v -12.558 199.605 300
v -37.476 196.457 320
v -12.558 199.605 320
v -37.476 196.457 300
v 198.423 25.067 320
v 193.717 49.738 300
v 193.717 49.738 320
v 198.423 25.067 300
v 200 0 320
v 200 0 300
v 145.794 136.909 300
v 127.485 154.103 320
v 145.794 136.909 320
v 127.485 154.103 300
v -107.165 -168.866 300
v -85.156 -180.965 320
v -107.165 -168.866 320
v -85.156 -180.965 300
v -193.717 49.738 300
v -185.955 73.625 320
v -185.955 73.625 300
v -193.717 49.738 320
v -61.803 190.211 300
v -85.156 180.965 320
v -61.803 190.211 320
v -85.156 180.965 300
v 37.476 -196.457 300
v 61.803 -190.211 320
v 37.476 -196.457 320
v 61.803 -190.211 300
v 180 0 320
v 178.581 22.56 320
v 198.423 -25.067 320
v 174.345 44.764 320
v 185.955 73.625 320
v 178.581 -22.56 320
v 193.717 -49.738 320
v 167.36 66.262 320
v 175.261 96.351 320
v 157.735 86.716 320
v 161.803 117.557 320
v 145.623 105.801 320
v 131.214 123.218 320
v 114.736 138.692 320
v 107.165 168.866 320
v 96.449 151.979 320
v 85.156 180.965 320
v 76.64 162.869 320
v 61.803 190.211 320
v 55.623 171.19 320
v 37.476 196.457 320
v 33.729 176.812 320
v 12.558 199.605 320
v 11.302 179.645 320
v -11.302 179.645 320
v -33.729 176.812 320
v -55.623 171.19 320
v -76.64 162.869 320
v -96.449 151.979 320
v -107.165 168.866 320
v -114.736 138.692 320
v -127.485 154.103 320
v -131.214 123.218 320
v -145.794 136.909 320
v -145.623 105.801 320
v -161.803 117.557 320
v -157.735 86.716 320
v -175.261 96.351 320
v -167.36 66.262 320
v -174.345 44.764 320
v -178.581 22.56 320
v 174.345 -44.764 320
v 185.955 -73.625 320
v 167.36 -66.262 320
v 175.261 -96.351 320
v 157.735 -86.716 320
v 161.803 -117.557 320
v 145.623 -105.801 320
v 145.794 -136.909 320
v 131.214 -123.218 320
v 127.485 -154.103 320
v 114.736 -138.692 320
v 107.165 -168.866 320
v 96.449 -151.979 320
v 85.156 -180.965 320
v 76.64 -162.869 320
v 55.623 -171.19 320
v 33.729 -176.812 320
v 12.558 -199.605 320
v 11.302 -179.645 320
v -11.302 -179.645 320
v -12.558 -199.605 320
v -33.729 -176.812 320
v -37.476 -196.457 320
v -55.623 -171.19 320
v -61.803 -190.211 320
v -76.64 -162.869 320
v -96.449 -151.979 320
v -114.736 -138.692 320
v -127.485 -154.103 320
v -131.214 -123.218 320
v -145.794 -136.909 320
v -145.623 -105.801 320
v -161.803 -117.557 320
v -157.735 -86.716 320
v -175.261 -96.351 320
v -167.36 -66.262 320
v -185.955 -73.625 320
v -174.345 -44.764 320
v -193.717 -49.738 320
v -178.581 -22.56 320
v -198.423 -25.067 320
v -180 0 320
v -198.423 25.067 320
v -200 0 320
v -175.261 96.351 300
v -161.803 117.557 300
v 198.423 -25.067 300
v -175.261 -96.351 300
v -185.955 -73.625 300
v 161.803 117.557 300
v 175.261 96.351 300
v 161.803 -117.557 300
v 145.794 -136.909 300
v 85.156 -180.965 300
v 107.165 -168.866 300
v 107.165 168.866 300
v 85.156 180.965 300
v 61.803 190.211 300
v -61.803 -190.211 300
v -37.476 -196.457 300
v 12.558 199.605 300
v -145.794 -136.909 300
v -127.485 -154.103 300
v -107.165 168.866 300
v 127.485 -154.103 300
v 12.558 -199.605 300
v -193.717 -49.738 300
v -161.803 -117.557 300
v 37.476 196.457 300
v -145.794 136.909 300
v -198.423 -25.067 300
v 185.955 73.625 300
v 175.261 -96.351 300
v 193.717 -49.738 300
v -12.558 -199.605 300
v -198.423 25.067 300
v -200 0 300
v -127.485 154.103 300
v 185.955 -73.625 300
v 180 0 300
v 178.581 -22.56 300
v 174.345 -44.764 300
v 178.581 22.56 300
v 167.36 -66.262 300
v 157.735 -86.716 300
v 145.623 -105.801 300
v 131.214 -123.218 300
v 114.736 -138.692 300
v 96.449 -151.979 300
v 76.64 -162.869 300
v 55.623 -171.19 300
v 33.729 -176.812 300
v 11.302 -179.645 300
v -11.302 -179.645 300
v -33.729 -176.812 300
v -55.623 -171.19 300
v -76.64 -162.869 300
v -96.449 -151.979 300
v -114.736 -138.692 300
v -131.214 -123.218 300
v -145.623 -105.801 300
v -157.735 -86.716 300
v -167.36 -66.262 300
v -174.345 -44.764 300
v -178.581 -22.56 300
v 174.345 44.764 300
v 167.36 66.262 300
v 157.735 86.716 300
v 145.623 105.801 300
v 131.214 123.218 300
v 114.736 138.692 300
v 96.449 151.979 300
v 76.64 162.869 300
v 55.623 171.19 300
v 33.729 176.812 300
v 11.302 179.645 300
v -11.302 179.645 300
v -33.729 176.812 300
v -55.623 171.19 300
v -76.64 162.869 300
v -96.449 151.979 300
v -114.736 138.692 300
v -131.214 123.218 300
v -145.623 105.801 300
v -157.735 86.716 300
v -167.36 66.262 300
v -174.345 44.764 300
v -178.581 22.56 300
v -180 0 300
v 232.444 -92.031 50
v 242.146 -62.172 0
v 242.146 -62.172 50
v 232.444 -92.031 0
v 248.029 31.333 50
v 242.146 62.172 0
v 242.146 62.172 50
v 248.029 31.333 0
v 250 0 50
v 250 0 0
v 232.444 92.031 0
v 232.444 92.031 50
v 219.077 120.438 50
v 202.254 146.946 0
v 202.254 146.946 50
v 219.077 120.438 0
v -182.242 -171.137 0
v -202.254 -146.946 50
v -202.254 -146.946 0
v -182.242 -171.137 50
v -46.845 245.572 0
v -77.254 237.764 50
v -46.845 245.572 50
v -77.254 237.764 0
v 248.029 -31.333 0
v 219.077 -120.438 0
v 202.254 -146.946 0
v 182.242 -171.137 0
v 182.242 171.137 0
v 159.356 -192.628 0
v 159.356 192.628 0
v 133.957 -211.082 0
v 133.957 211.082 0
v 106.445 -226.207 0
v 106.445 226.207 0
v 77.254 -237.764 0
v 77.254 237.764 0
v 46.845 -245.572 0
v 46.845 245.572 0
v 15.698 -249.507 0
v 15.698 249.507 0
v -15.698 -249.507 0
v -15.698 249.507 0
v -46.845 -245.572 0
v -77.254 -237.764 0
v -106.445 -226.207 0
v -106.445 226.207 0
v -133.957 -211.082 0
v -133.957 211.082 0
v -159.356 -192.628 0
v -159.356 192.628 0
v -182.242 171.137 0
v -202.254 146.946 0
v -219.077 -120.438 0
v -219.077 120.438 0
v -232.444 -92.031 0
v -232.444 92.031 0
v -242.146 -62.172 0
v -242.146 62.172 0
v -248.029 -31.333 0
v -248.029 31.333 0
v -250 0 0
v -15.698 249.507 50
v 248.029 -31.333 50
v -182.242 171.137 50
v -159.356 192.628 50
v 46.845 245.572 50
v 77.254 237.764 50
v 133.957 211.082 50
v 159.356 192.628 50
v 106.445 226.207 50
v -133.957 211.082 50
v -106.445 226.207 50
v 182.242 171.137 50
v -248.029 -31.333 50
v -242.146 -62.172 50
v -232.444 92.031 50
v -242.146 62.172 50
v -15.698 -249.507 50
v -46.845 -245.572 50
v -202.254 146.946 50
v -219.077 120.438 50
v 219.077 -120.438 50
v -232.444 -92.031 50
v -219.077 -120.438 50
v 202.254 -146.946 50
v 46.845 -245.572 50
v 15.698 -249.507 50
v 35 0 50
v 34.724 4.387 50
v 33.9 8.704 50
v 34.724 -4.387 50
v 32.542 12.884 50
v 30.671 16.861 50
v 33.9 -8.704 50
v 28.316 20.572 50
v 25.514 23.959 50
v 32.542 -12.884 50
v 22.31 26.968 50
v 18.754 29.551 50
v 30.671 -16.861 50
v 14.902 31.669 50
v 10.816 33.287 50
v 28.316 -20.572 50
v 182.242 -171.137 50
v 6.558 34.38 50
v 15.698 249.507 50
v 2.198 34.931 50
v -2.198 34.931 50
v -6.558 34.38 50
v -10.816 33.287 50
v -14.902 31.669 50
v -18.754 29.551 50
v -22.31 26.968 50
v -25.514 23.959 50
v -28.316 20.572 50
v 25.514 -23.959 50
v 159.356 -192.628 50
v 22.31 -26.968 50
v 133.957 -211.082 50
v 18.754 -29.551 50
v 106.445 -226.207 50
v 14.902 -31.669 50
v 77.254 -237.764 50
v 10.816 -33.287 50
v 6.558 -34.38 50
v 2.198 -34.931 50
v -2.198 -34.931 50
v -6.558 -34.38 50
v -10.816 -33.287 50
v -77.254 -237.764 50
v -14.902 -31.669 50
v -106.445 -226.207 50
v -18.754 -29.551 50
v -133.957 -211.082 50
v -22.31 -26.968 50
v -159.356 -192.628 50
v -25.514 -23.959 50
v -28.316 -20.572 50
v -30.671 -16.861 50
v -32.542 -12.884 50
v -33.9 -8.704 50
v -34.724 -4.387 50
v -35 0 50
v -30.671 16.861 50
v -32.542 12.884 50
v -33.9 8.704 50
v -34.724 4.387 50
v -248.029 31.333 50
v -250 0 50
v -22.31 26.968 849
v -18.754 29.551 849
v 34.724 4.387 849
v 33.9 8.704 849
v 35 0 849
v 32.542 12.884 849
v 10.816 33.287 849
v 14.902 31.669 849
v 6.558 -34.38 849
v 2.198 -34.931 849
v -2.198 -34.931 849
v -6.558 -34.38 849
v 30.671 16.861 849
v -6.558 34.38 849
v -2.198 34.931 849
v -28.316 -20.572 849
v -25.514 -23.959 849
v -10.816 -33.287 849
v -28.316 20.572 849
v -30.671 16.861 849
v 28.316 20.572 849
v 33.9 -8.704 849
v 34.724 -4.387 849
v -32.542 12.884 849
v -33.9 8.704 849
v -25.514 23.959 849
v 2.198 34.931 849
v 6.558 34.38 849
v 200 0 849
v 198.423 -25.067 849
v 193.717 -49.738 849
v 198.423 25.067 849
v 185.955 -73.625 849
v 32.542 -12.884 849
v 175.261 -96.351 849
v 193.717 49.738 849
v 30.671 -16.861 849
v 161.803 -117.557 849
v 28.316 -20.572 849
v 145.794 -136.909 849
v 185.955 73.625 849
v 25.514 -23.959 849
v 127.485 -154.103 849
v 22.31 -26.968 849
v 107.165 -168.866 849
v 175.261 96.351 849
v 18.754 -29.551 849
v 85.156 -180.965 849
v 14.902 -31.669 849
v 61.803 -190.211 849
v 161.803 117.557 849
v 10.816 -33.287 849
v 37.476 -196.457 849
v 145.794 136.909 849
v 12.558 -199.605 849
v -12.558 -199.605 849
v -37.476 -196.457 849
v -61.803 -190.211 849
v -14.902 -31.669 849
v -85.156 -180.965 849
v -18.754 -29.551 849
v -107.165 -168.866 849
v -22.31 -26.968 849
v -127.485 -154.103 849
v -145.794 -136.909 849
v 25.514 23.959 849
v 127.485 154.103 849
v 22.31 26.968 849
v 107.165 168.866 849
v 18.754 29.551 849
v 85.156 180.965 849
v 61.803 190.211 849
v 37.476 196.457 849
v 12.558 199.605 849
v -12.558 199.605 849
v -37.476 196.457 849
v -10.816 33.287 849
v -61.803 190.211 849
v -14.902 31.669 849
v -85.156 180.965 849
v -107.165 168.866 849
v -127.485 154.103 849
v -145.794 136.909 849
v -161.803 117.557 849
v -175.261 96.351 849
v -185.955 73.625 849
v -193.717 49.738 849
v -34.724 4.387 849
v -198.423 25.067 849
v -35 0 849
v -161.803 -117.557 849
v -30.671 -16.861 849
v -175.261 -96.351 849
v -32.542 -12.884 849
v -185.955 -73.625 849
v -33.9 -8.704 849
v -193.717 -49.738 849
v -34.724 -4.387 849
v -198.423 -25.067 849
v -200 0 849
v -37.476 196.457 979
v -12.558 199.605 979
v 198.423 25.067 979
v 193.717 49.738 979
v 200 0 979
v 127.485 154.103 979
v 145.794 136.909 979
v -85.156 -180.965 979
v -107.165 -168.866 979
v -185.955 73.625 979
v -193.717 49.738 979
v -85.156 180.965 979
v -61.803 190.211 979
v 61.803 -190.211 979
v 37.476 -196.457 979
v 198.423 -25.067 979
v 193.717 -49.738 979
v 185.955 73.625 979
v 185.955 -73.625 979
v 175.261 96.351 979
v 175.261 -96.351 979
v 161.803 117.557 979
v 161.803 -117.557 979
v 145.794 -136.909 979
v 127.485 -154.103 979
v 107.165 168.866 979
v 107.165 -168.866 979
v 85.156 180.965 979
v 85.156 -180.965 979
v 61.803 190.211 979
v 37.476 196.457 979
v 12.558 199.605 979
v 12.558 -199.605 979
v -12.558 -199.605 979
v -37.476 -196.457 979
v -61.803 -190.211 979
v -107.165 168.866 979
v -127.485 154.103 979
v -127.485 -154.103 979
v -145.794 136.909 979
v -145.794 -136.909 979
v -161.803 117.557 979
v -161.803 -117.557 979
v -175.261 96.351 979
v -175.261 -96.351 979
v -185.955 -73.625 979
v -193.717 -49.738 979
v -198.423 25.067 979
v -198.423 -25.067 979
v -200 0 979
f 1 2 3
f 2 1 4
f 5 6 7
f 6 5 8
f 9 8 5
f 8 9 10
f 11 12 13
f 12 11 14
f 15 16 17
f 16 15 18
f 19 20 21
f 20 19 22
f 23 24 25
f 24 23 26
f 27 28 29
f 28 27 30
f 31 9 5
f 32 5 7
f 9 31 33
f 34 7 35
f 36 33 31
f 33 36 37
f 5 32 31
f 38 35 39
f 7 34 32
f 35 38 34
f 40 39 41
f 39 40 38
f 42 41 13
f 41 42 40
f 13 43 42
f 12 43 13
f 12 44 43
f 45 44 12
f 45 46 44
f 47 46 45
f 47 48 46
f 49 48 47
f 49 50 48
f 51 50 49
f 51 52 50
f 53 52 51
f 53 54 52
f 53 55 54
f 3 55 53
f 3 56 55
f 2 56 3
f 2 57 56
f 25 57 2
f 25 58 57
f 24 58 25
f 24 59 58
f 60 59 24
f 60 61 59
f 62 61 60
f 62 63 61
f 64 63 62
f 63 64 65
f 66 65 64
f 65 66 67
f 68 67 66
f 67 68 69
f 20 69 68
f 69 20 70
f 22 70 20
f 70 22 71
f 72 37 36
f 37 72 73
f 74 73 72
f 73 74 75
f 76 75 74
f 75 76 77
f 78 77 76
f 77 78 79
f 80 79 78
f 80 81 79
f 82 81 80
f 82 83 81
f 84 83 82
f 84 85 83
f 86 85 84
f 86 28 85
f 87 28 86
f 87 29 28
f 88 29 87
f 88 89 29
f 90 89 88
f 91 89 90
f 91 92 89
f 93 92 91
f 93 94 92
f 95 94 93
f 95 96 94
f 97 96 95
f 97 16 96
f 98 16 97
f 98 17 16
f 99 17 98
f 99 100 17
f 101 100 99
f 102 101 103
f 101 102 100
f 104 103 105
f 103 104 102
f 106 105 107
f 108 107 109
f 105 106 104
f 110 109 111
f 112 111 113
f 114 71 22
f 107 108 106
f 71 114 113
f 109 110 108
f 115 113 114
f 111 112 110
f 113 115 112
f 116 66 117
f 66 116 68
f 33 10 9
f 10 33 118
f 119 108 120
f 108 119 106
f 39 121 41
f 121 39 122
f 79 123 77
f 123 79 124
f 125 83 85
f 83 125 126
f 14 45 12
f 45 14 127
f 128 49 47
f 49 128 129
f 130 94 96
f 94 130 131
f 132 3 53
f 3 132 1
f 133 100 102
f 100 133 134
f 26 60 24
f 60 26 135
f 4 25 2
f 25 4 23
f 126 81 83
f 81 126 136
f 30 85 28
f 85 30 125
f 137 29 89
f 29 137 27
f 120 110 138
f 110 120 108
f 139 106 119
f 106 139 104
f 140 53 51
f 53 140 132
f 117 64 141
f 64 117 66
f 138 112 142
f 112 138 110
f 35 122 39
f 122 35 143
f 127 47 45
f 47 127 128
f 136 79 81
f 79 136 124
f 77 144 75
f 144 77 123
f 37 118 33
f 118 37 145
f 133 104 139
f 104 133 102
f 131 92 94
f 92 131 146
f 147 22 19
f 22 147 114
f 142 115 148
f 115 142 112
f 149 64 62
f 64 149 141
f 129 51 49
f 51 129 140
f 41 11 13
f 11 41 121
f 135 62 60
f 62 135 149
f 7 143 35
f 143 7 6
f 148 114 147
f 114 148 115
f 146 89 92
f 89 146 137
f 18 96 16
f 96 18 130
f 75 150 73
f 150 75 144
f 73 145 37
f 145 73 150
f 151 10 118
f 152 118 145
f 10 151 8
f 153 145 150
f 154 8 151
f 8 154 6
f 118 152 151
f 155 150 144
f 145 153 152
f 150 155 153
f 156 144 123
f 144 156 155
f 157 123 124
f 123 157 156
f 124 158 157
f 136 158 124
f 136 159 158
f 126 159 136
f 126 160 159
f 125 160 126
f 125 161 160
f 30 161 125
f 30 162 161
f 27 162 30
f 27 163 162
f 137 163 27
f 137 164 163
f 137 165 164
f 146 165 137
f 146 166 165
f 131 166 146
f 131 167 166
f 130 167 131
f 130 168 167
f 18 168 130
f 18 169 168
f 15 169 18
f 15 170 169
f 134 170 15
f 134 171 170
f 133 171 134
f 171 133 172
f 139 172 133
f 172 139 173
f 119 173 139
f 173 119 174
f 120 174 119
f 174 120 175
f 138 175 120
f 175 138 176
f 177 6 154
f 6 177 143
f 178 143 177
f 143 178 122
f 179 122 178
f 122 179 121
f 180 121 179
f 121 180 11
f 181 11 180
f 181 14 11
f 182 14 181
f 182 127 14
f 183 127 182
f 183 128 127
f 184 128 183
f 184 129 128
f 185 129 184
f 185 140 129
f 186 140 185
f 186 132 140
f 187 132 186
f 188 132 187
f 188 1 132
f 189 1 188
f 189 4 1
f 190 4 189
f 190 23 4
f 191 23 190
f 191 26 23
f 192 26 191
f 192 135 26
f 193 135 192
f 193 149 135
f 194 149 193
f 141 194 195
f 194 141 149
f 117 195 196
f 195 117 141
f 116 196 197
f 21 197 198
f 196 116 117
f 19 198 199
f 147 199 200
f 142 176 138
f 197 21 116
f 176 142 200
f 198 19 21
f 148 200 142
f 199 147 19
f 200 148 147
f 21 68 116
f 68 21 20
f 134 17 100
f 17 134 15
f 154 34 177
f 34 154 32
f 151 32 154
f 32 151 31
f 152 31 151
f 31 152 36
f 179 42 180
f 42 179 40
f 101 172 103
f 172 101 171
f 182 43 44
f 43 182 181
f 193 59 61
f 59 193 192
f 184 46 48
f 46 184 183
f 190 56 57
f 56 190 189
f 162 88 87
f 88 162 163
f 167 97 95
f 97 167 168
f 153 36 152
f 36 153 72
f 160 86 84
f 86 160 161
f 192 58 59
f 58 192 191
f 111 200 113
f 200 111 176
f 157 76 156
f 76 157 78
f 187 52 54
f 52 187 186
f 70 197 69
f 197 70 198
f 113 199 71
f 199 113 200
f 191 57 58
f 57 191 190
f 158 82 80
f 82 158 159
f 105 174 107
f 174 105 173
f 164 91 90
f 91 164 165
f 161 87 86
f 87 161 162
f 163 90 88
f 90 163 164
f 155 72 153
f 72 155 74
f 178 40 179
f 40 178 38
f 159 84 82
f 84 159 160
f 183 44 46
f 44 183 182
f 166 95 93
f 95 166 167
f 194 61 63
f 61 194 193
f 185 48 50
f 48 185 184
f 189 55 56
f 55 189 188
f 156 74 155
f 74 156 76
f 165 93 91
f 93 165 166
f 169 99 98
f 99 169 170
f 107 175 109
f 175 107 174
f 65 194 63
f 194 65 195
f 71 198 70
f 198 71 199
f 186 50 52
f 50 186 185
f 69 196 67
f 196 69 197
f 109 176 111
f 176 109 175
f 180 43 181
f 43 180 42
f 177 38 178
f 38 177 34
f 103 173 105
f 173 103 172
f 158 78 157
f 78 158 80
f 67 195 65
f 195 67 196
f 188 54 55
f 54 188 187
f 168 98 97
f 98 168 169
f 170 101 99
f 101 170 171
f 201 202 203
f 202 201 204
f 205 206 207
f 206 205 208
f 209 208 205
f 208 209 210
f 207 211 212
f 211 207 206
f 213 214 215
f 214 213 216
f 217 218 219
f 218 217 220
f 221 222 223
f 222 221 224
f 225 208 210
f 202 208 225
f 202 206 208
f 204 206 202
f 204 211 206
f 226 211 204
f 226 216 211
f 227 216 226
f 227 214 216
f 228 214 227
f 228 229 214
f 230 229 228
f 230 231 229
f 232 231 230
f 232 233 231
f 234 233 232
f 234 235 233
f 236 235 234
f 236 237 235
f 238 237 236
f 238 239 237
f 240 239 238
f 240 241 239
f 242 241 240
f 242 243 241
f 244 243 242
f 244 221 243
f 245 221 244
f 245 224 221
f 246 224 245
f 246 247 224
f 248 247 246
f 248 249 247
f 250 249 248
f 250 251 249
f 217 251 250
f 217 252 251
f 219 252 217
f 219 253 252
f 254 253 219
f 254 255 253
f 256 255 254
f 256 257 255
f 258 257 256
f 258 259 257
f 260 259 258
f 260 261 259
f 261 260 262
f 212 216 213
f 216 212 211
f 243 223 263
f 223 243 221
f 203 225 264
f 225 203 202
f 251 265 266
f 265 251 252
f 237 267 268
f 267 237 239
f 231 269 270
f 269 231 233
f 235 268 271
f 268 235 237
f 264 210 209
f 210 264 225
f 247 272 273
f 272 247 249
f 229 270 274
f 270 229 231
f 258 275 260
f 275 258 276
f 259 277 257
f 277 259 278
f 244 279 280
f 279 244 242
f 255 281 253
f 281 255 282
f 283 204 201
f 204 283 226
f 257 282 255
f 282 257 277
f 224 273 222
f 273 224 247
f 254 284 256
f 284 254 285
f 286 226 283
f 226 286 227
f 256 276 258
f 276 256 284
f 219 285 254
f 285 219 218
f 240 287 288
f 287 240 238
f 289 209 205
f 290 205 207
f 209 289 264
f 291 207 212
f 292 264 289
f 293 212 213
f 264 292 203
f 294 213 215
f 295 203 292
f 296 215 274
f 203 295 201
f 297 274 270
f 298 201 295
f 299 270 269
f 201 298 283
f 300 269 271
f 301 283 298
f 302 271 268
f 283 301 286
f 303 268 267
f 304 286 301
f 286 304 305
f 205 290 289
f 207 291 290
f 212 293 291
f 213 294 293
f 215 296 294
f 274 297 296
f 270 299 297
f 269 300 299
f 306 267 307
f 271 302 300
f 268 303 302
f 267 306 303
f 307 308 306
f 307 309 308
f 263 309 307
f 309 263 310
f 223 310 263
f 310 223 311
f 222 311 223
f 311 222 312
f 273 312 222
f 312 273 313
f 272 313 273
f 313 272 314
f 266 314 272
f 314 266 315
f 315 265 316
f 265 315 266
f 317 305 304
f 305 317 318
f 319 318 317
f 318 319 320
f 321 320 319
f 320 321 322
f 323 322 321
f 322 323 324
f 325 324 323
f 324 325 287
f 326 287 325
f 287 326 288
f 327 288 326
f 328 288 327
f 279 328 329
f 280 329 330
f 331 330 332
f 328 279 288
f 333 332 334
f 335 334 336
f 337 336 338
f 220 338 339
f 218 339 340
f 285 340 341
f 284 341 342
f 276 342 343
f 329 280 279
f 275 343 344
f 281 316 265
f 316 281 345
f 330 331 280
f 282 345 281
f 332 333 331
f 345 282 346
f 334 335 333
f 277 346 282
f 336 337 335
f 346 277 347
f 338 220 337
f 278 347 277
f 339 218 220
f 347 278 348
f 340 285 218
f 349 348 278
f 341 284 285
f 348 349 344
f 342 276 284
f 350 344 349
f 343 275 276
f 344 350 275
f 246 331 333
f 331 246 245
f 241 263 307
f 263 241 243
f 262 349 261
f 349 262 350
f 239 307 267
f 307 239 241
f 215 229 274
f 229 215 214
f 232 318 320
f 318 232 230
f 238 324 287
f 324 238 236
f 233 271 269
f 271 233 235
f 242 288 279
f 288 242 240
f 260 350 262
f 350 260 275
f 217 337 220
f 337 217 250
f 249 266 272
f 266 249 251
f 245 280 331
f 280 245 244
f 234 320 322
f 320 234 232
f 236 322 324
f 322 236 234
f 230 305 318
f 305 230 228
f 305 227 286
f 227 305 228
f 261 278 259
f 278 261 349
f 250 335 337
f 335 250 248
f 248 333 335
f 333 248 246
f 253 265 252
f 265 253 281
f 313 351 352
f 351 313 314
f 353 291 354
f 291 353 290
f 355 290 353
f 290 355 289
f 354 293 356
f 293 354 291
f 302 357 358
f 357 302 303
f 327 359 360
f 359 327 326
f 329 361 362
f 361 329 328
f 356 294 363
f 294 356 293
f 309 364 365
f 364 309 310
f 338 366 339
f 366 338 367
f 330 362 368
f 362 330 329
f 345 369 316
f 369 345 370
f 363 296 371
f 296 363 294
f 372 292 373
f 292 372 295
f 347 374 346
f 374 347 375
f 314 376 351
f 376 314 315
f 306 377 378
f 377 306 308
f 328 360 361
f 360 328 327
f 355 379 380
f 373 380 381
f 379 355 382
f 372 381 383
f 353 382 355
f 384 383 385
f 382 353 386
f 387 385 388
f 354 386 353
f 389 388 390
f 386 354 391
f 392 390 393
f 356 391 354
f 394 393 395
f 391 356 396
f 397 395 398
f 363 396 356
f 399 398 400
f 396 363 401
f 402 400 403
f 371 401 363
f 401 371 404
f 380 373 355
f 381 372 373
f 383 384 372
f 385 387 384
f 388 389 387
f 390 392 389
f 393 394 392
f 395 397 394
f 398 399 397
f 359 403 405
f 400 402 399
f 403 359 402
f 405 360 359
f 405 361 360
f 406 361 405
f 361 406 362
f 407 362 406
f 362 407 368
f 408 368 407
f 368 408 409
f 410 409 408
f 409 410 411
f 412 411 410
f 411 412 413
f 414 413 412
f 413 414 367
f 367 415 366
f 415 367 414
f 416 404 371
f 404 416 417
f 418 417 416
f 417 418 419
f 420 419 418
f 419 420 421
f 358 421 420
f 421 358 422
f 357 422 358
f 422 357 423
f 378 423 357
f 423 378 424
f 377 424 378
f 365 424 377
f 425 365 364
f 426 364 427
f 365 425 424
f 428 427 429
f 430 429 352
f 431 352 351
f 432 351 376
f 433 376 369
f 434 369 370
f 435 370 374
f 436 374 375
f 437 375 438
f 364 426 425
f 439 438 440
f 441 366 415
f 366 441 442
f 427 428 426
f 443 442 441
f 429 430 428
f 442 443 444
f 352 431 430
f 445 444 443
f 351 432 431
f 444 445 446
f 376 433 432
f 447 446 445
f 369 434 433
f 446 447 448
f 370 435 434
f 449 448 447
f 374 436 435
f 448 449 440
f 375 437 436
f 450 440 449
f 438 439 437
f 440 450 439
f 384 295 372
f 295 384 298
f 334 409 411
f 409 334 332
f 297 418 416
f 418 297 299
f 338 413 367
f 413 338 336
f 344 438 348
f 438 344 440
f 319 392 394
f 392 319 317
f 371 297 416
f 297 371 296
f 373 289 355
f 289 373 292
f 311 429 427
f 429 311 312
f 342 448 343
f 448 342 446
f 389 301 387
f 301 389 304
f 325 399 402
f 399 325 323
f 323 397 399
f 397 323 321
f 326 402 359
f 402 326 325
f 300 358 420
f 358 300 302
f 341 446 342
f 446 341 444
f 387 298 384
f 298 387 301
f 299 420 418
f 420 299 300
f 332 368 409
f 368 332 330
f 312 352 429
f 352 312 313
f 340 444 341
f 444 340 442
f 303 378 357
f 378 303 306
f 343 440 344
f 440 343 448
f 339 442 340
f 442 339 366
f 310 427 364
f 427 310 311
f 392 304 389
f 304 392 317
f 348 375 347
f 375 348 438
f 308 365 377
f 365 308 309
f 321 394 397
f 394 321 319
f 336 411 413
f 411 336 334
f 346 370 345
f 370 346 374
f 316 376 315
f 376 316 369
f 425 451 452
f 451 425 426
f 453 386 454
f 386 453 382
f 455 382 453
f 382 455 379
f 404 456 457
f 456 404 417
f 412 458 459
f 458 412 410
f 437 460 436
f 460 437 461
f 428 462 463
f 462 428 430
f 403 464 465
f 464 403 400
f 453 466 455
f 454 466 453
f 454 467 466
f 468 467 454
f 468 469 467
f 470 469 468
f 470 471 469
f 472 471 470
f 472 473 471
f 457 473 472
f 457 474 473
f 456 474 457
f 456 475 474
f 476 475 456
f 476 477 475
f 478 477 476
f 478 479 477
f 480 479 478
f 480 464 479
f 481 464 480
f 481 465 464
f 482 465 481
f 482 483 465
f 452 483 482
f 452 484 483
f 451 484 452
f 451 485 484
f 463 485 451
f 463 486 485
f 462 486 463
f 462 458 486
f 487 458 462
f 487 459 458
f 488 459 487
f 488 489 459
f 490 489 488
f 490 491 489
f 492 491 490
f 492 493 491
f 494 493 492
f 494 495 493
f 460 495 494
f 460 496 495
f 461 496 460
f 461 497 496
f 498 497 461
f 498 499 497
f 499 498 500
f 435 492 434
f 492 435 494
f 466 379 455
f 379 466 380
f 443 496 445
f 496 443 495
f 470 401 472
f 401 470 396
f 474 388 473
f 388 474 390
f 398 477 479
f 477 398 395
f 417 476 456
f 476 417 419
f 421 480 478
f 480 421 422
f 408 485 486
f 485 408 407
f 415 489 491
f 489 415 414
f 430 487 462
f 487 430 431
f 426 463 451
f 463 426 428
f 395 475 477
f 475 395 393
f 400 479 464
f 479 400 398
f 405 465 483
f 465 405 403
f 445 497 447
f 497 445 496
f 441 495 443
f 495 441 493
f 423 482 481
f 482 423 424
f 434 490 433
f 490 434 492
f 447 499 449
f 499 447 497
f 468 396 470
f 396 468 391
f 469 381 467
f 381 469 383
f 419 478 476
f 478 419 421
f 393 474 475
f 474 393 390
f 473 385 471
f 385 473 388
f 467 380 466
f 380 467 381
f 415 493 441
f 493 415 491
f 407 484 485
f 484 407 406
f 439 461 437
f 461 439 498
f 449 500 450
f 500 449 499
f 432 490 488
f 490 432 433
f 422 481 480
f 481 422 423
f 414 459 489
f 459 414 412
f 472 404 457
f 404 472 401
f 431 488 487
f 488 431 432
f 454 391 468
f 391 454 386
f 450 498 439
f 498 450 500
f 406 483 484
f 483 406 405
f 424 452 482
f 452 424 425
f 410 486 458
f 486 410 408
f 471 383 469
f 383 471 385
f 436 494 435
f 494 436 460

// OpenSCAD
eps = 1;
fn = 50;
// scale( [0.001, 0.001, 0.001] )
  barhocker();


module barhocker( foot_diameter=500, foot_height=50,
                  foot_rest_diameter = 400, foot_rest_height = 300, foot_rest_thickness = 20,
                  pillar_diameter=70, pillar_height=800,
                  seat_diameter=400, seat_height=130 ) 
{
  color( [0.9, 0.9, 0.9] ) 
    cylinder( d=foot_diameter, h=foot_height, center=false, $fn=fn );
  color( [0.9, 0.9, 0.9] ) 
    translate( [0,0,foot_height-eps] )
      cylinder( d=pillar_diameter, h=pillar_height, center=false, $fn=fn );
  color( [0.9, 0.9, 0.9] ) 
    difference() {
      translate( [0,0,foot_rest_height] )
        cylinder( d=foot_rest_diameter, h=foot_rest_thickness, center=false, $fn=fn );
      translate( [0,0,foot_rest_height-eps] )
        cylinder( d=foot_rest_diameter-2*foot_rest_thickness, 
                  h=foot_rest_thickness+4*eps, center=false, $fn=fn );
      }
  color( [0.6, 0.2, 0.2] ) 
    translate( [0,0,foot_height+pillar_height-eps] )
      cylinder( d=seat_diameter, h=seat_height, center=false, $fn=fn );
}
